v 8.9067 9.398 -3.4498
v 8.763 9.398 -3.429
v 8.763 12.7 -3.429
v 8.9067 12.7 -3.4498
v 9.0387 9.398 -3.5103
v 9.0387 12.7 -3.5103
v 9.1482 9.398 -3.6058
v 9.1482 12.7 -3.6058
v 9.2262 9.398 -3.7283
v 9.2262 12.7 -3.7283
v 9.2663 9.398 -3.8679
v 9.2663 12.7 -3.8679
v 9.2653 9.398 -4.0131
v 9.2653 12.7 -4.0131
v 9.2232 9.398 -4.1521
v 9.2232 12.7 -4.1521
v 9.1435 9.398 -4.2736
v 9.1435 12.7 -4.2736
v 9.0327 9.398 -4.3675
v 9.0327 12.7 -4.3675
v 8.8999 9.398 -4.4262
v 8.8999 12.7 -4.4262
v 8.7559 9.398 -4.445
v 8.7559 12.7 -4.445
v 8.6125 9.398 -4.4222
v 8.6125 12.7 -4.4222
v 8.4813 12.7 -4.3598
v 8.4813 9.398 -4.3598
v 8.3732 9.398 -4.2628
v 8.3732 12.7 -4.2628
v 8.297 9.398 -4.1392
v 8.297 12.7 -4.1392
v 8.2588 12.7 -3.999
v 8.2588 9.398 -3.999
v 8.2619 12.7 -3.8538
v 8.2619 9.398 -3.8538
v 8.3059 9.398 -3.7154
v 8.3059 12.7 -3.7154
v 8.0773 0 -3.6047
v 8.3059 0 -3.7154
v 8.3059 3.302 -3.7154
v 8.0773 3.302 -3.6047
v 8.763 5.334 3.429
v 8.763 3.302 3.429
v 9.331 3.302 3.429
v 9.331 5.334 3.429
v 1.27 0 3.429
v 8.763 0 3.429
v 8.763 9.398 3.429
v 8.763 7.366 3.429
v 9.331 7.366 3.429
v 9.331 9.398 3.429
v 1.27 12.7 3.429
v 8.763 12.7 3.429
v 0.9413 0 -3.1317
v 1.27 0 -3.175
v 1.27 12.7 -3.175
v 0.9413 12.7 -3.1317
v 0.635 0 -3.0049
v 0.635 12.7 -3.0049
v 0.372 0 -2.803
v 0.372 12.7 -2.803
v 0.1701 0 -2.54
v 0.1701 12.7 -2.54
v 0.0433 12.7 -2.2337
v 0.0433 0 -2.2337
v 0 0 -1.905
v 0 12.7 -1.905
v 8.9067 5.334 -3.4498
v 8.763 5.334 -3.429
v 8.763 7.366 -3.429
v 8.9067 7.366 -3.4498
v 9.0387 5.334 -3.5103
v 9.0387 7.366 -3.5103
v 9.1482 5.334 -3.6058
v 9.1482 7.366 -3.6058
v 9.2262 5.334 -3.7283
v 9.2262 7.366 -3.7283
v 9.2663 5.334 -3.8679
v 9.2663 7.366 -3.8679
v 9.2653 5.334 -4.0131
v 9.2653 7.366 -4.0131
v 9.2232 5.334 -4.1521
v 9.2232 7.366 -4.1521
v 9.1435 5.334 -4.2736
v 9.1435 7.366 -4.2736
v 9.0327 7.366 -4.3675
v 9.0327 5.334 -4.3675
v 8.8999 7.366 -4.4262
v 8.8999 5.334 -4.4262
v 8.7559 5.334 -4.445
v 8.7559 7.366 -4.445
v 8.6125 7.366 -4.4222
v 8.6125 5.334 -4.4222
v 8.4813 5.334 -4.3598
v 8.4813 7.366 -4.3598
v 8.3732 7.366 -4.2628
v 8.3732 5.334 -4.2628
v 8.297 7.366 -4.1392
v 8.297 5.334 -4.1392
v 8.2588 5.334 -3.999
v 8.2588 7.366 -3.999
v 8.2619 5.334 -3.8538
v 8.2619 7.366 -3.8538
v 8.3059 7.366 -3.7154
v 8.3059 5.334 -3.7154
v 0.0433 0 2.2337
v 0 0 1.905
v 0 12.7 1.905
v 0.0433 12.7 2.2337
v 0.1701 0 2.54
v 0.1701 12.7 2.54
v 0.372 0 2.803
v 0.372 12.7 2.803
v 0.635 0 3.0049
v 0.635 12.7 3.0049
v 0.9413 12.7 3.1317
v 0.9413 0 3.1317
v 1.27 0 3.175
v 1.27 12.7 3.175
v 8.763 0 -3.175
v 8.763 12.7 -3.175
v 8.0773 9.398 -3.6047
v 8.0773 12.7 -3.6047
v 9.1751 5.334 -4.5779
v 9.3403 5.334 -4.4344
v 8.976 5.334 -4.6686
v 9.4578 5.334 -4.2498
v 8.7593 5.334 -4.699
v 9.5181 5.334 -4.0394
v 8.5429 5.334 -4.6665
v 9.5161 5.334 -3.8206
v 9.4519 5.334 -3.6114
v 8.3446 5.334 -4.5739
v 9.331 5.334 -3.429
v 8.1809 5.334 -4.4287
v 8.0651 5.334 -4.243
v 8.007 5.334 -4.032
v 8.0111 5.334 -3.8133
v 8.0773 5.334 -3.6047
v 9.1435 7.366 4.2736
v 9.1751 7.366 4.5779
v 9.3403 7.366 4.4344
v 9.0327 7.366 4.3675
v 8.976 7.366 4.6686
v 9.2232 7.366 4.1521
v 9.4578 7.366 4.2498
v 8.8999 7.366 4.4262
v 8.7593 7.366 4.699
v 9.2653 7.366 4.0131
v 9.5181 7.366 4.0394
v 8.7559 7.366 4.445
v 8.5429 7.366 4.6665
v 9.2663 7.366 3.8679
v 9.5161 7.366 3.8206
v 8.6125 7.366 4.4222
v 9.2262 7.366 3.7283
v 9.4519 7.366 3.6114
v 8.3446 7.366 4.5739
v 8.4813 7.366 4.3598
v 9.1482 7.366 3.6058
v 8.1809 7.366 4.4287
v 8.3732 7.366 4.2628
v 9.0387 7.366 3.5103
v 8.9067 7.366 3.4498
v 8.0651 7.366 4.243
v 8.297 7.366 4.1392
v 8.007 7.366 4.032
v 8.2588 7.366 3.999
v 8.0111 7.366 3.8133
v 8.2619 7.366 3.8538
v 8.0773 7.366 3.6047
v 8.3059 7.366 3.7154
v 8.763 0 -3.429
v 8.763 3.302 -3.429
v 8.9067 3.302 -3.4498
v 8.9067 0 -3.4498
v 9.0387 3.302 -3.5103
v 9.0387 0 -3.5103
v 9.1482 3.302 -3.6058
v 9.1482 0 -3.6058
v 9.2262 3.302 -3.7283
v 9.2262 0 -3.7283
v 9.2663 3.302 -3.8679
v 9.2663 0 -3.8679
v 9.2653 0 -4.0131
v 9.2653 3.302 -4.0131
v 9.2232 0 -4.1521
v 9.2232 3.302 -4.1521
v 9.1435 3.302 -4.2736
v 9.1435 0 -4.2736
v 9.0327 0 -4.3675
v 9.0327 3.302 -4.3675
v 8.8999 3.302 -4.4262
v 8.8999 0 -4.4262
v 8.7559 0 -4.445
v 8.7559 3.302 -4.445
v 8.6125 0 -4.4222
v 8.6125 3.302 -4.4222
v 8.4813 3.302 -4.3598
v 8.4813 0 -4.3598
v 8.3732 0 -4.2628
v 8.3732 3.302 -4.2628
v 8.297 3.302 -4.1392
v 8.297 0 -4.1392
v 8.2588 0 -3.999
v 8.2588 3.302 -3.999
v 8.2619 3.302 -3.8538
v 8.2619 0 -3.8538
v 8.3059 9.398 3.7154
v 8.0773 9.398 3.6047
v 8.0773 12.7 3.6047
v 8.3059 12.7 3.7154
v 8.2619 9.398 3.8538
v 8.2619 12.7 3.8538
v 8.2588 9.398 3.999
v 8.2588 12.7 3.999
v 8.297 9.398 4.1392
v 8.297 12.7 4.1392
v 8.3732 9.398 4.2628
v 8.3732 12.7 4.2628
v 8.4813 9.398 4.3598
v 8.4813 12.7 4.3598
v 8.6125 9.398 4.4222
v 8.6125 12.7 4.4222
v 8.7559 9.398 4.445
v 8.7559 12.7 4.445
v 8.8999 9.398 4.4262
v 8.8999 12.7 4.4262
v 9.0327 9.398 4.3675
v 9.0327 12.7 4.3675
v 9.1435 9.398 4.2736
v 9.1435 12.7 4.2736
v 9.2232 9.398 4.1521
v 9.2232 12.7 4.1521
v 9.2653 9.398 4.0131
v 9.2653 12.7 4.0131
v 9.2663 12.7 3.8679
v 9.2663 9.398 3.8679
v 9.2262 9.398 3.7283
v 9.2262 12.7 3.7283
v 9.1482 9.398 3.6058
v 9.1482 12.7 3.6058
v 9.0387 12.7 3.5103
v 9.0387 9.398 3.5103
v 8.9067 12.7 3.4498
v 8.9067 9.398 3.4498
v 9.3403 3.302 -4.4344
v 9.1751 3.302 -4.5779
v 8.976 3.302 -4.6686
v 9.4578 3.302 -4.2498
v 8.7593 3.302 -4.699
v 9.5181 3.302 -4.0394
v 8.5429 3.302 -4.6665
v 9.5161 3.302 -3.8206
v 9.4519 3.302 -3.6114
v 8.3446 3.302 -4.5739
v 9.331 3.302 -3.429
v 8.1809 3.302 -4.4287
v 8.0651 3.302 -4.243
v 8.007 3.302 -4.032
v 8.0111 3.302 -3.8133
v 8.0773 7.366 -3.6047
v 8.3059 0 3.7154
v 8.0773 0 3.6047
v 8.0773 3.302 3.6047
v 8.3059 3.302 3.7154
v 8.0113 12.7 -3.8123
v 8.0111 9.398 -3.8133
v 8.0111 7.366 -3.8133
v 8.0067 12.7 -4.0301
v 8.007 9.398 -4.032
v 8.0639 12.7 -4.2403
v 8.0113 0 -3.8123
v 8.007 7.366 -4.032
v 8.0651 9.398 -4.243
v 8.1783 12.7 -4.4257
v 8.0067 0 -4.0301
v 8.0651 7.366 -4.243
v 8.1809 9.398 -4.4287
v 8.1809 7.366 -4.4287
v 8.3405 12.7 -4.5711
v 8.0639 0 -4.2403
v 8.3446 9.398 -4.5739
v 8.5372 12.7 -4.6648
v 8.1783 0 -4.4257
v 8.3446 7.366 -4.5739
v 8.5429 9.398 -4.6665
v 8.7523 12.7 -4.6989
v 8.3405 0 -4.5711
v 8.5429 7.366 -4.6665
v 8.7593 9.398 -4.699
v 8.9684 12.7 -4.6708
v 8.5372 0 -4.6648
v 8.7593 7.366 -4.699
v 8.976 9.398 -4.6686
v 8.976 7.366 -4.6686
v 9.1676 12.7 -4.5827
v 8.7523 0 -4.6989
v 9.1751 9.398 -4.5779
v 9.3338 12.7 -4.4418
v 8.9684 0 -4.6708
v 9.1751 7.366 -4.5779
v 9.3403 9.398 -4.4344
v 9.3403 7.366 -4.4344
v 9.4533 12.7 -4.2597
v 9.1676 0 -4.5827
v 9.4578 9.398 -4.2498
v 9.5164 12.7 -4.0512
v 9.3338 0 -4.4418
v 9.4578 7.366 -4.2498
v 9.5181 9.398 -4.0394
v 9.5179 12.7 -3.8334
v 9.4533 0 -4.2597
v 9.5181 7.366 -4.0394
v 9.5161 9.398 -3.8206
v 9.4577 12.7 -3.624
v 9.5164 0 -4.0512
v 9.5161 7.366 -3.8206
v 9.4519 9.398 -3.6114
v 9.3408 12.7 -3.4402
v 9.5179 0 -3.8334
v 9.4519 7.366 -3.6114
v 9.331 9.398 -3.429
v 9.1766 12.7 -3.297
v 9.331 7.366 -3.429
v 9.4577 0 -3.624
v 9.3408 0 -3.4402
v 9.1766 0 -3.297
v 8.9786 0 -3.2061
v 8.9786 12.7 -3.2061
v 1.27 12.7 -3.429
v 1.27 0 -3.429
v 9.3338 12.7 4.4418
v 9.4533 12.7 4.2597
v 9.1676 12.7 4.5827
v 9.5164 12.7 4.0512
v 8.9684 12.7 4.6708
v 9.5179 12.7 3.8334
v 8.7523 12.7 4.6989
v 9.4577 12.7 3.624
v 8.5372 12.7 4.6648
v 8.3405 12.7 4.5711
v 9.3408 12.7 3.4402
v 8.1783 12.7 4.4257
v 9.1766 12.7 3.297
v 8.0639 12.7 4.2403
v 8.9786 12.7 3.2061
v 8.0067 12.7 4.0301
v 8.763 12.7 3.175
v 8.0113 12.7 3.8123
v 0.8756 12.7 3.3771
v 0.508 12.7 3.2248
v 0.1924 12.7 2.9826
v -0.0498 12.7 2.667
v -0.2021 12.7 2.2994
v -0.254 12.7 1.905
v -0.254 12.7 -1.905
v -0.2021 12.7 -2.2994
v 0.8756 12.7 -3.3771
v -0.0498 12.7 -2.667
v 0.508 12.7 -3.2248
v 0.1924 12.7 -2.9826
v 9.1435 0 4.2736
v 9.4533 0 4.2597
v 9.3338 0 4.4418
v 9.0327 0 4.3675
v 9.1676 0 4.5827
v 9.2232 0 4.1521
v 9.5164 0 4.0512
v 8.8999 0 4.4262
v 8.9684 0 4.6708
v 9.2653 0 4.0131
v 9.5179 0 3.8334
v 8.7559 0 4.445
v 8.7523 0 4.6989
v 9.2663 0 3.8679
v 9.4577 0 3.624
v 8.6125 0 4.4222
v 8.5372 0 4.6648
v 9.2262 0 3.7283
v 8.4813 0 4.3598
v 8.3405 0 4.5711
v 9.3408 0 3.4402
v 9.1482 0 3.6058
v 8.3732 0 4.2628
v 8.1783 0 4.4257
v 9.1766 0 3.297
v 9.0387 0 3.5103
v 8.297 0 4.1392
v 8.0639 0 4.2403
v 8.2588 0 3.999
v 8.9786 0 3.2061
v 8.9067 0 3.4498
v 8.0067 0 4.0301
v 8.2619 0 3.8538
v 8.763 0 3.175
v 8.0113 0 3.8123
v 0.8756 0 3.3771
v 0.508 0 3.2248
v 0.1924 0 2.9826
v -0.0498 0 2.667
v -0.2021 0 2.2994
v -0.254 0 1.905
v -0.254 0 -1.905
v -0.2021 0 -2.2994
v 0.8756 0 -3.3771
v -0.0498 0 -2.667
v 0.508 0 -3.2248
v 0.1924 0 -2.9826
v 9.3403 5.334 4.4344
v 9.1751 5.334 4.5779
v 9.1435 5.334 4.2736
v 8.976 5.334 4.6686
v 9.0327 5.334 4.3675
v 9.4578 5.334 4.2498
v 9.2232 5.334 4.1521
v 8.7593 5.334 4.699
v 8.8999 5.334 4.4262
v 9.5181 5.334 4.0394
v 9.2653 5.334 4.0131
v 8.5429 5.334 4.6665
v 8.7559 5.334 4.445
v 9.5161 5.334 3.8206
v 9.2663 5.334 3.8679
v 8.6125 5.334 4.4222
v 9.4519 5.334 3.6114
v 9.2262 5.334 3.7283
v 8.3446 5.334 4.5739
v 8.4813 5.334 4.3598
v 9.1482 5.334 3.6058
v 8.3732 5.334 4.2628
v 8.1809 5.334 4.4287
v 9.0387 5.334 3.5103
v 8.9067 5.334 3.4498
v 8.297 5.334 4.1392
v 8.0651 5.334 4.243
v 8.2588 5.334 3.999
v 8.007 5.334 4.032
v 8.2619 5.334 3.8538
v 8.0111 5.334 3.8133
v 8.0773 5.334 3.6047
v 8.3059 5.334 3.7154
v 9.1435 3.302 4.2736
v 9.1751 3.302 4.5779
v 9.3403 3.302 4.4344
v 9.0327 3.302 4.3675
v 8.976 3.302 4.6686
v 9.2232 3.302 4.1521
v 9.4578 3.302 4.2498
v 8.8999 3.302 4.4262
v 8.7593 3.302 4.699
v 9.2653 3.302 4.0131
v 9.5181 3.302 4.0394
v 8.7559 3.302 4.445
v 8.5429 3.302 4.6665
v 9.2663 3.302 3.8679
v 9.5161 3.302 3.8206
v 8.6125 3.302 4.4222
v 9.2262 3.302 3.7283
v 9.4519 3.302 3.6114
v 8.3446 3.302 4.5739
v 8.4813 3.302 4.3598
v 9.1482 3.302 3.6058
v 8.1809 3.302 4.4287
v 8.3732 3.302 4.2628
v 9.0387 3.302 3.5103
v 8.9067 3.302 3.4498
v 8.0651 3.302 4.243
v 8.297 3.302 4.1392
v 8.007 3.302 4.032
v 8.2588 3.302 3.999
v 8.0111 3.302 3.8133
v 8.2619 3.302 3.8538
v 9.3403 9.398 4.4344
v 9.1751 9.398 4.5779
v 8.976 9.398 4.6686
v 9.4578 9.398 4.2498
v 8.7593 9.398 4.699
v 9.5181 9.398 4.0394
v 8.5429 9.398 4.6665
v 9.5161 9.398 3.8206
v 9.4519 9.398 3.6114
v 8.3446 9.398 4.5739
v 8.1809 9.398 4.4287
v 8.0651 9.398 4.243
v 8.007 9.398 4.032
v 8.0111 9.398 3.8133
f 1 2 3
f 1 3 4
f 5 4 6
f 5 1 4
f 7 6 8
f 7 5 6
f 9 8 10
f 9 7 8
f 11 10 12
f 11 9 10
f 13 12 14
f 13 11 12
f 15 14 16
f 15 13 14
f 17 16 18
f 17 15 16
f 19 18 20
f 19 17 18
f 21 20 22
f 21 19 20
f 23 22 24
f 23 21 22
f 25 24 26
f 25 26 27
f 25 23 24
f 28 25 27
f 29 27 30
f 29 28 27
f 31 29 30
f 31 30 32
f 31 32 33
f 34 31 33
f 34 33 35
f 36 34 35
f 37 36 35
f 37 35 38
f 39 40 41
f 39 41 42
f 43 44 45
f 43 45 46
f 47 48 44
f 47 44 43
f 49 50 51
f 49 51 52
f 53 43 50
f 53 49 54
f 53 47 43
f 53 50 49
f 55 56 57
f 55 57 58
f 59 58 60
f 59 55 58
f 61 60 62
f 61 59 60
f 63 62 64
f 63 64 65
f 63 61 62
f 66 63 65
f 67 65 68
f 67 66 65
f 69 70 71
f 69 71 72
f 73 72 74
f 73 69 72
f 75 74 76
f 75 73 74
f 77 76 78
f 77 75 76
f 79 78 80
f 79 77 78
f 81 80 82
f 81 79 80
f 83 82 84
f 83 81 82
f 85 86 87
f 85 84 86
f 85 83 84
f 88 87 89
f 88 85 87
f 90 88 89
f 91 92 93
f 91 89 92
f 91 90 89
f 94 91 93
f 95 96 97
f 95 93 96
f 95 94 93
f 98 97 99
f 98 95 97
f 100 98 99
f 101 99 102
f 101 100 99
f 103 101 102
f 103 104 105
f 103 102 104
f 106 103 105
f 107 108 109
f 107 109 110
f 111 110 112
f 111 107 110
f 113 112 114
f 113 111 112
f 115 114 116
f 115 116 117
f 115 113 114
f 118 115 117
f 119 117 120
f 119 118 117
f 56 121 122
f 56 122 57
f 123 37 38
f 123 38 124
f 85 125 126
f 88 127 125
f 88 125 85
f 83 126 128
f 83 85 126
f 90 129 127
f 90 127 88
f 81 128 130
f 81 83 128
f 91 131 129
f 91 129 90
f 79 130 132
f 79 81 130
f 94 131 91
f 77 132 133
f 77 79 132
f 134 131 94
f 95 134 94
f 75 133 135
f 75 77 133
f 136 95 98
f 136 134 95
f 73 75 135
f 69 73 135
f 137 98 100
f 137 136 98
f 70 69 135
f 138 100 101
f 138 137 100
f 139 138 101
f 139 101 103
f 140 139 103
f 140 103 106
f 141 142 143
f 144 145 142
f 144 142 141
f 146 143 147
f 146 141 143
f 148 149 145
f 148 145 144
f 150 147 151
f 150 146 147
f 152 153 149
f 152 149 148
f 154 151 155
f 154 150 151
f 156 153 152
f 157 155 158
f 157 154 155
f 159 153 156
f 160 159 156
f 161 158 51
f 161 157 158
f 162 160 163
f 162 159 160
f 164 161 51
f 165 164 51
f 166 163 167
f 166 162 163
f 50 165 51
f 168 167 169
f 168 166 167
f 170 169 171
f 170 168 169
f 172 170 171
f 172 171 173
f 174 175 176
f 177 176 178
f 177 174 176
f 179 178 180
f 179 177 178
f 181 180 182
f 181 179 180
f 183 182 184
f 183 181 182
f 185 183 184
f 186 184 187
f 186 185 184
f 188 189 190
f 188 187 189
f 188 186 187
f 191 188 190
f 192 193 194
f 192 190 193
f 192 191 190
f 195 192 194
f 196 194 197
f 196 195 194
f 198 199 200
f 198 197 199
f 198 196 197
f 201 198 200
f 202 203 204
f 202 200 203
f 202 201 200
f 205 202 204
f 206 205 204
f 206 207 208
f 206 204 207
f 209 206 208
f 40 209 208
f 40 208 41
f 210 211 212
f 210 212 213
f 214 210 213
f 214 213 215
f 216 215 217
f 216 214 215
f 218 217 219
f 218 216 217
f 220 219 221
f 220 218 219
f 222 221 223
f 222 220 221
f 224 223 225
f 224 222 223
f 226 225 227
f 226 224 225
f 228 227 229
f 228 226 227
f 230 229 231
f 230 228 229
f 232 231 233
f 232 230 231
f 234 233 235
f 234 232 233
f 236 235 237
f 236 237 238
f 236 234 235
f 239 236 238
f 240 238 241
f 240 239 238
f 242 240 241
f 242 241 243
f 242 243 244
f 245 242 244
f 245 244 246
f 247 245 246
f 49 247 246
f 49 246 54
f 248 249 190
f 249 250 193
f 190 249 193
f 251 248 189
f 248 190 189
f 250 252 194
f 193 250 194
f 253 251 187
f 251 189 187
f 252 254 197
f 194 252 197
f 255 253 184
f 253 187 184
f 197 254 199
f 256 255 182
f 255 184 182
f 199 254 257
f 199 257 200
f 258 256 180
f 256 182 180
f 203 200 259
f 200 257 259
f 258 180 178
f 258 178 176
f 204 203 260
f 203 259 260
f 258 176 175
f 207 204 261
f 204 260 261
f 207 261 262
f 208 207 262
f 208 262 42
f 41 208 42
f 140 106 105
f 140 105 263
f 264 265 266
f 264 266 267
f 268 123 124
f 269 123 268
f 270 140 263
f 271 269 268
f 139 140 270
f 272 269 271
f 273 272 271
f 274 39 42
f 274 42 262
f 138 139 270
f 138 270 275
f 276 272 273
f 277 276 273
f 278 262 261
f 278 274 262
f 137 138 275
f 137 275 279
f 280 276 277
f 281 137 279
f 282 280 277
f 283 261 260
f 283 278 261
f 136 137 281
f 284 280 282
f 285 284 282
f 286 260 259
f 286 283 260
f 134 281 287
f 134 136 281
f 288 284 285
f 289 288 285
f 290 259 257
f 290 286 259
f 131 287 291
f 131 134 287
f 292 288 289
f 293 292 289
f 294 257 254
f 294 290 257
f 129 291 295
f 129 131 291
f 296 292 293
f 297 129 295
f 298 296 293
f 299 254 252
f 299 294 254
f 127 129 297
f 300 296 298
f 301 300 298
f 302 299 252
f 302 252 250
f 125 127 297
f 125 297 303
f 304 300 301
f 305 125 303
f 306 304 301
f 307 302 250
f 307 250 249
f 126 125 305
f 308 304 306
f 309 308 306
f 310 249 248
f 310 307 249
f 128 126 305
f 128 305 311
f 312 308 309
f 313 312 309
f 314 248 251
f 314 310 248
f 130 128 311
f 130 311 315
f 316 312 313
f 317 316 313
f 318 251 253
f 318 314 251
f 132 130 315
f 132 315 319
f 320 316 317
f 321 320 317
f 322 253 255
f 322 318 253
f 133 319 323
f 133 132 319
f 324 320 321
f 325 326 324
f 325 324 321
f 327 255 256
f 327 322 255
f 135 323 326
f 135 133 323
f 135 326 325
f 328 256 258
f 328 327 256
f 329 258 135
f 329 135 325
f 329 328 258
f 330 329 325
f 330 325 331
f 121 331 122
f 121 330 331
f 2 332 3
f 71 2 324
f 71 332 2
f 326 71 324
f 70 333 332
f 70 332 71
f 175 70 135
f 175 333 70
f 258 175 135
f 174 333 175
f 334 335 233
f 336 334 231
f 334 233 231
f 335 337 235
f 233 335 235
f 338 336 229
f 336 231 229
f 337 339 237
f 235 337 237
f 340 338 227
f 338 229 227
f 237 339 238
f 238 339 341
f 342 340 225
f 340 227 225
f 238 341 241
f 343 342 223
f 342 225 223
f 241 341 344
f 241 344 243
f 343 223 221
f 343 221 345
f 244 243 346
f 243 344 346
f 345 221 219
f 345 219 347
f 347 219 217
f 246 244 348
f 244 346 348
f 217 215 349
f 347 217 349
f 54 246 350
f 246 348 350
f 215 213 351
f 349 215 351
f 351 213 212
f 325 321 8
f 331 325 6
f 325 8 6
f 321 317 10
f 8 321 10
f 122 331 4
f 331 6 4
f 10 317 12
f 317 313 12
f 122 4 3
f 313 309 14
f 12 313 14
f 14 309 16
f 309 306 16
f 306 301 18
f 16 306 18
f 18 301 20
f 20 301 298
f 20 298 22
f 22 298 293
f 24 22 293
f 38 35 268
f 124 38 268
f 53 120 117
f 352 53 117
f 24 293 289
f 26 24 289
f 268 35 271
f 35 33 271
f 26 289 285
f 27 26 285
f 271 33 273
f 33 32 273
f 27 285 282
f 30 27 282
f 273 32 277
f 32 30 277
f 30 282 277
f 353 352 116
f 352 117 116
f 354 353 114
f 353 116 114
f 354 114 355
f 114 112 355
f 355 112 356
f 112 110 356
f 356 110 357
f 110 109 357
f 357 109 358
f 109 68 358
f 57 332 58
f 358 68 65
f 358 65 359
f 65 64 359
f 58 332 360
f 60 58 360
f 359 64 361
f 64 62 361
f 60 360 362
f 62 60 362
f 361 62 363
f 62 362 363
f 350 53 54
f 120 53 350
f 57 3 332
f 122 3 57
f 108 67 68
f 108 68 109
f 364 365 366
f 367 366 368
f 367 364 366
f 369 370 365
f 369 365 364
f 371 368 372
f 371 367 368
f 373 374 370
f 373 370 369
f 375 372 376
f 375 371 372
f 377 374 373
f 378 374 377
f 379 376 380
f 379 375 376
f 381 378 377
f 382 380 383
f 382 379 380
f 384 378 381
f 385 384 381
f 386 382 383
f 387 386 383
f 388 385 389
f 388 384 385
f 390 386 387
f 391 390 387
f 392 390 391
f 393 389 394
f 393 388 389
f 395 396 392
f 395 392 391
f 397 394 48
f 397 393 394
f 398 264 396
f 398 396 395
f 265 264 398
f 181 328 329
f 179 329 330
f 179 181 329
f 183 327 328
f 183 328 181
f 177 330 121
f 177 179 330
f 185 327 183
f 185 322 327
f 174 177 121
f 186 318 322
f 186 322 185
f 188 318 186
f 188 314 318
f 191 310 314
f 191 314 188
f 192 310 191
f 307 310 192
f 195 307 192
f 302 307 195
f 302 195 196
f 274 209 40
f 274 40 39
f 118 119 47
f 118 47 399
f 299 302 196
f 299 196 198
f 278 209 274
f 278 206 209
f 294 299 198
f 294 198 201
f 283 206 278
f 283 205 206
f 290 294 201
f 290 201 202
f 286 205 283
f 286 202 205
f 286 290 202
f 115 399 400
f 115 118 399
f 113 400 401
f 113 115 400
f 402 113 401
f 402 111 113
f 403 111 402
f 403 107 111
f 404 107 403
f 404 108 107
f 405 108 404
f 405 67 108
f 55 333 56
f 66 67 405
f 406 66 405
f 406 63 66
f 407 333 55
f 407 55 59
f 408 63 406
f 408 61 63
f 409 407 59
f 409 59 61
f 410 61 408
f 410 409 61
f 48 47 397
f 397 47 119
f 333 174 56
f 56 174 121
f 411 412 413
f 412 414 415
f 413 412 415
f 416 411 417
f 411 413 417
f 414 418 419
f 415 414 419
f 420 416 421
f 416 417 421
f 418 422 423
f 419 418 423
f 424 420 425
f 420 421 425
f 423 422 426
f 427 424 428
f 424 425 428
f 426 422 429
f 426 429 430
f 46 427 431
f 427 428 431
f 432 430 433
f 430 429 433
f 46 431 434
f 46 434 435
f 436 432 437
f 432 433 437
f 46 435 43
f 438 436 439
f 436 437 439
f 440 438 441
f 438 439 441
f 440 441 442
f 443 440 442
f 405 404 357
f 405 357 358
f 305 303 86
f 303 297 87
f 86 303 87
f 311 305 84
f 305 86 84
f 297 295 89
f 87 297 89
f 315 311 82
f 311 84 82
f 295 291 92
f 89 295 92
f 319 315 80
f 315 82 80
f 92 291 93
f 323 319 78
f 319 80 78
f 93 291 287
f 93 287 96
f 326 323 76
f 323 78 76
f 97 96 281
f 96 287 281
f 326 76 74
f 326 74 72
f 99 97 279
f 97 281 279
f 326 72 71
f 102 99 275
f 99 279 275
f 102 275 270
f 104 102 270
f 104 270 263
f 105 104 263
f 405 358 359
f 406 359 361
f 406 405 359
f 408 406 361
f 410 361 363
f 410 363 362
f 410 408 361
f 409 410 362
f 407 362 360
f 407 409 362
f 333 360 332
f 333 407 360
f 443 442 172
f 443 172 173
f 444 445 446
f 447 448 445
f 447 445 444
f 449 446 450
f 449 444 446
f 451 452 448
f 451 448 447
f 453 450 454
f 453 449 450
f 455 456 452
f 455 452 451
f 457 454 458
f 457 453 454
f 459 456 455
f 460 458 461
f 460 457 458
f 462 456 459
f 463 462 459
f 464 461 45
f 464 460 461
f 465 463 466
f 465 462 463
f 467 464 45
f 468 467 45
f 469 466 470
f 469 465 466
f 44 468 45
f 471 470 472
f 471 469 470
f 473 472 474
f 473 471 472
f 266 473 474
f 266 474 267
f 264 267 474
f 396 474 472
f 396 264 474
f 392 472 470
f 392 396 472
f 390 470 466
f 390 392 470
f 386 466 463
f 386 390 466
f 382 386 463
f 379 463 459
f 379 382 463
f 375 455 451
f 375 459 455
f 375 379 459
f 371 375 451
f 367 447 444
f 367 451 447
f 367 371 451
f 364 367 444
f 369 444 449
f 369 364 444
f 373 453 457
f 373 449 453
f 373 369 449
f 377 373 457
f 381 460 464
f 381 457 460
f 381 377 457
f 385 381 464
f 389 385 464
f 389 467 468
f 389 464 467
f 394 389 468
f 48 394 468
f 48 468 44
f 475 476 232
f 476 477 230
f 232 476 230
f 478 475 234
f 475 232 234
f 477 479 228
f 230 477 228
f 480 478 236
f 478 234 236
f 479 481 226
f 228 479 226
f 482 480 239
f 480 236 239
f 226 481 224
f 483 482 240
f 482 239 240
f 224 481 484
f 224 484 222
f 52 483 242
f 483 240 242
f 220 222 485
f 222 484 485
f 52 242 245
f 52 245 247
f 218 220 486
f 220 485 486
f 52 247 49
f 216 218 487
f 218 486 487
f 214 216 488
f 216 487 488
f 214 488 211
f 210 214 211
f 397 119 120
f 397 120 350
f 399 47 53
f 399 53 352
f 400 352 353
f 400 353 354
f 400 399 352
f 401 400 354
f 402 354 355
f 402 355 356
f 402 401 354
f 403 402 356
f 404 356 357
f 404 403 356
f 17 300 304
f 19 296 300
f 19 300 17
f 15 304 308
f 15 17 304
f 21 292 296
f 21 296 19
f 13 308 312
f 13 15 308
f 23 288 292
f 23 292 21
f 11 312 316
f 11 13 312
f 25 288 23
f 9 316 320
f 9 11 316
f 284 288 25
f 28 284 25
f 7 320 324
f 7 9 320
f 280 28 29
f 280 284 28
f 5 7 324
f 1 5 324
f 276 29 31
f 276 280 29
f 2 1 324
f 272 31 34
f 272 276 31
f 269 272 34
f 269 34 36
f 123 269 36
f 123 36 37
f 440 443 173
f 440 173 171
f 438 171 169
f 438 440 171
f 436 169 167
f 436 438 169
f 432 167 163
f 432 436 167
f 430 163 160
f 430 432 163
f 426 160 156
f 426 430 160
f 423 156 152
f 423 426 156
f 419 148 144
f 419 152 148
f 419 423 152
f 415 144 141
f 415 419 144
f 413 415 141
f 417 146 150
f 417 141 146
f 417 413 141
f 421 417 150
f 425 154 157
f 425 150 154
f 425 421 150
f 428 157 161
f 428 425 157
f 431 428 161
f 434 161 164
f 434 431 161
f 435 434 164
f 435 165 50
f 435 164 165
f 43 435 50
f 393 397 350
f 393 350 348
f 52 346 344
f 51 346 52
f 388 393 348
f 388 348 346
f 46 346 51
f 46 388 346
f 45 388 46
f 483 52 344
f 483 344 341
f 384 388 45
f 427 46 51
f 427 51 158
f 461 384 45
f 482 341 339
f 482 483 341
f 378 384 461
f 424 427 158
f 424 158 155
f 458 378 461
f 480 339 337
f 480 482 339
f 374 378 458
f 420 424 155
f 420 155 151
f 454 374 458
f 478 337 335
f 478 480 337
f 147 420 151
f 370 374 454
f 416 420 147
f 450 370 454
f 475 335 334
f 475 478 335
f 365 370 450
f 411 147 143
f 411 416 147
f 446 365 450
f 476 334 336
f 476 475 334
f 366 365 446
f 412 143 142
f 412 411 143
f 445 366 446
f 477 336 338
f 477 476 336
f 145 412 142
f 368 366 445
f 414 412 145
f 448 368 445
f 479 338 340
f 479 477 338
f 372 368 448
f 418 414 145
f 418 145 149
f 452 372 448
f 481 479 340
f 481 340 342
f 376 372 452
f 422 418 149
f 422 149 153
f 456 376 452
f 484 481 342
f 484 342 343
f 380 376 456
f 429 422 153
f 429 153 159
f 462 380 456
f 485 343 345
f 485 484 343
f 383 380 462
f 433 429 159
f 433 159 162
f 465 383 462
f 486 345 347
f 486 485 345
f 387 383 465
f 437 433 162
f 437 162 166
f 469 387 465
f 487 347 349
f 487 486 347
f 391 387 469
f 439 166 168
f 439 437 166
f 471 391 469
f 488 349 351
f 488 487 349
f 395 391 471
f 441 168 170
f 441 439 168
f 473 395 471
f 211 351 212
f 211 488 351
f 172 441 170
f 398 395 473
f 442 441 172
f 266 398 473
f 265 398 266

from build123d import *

# Parameters (mm, degrees)
BOSS_EXTRUDE1_DEPTH = 12.7
SKETCH2_W           = 2.488429633
SKETCH2_H           = 2.032
CUT_EXTRUDE1_DEPTH  = 12.7


with BuildPart() as part:
    # Sketch1 → Boss-Extrude1 (new body)
    with BuildSketch(Plane(origin=(0, 0, 0), x_dir=(1, 0, 0), z_dir=(0, 1, 0))):
        with BuildLine():
            ThreePointArc((8.763, -3.175), (9.167603241, -4.582709081), (8.077288748, -3.60466872))
            Line((8.077288748, -3.60466872), (8.305859166, -3.715445814))
            ThreePointArc((8.305859166, -3.715445814), (9.032735494, -4.367472721), (8.763, -3.429))
            Line((8.763, -3.429), (1.27, -3.429))
            ThreePointArc((1.27, -3.429), (0.192369265, -2.982630735), (-0.254, -1.905))
            Line((-0.254, -1.905), (-0.254, 1.905))
            ThreePointArc((-0.254, 1.905), (0.192369265, 2.982630735), (1.27, 3.429))
            Line((1.27, 3.429), (8.763, 3.429))
            ThreePointArc((8.763, 3.429), (9.032735494, 4.367472721), (8.305859166, 3.715445814))
            Line((8.305859166, 3.715445814), (8.077288748, 3.60466872))
            ThreePointArc((8.077288748, 3.60466872), (9.167603241, 4.582709081), (8.763, 3.175))
            Line((8.763, 3.175), (1.27, 3.175))
            ThreePointArc((1.27, 3.175), (0.371974388, 2.803025612), (0, 1.905))
            Line((0, 1.905), (0, -1.905))
            ThreePointArc((0, -1.905), (0.371974388, -2.803025612), (1.27, -3.175))
            Line((1.27, -3.175), (8.763, -3.175))
        make_face()
    extrude(amount=BOSS_EXTRUDE1_DEPTH)

    # Sketch2 → Cut-Extrude1 (cut)
    with BuildSketch(Plane.ZY.offset(0.254)):
        with Locations((-4.673214816, 8.382)):
            Rectangle(SKETCH2_W, SKETCH2_H)
        with Locations((-4.673214816, 4.318)):
            Rectangle(SKETCH2_W, SKETCH2_H)
    cut_extrude1 = extrude(amount=-CUT_EXTRUDE1_DEPTH, mode=Mode.SUBTRACT)

    # Mirror1: Cut-Extrude1 across plane
    add(cut_extrude1.mirror(Plane(origin=(0, 0, 0), x_dir=(1, 0, 0), z_dir=(0, 0, -1))), mode=Mode.SUBTRACT)


solid = part.part
